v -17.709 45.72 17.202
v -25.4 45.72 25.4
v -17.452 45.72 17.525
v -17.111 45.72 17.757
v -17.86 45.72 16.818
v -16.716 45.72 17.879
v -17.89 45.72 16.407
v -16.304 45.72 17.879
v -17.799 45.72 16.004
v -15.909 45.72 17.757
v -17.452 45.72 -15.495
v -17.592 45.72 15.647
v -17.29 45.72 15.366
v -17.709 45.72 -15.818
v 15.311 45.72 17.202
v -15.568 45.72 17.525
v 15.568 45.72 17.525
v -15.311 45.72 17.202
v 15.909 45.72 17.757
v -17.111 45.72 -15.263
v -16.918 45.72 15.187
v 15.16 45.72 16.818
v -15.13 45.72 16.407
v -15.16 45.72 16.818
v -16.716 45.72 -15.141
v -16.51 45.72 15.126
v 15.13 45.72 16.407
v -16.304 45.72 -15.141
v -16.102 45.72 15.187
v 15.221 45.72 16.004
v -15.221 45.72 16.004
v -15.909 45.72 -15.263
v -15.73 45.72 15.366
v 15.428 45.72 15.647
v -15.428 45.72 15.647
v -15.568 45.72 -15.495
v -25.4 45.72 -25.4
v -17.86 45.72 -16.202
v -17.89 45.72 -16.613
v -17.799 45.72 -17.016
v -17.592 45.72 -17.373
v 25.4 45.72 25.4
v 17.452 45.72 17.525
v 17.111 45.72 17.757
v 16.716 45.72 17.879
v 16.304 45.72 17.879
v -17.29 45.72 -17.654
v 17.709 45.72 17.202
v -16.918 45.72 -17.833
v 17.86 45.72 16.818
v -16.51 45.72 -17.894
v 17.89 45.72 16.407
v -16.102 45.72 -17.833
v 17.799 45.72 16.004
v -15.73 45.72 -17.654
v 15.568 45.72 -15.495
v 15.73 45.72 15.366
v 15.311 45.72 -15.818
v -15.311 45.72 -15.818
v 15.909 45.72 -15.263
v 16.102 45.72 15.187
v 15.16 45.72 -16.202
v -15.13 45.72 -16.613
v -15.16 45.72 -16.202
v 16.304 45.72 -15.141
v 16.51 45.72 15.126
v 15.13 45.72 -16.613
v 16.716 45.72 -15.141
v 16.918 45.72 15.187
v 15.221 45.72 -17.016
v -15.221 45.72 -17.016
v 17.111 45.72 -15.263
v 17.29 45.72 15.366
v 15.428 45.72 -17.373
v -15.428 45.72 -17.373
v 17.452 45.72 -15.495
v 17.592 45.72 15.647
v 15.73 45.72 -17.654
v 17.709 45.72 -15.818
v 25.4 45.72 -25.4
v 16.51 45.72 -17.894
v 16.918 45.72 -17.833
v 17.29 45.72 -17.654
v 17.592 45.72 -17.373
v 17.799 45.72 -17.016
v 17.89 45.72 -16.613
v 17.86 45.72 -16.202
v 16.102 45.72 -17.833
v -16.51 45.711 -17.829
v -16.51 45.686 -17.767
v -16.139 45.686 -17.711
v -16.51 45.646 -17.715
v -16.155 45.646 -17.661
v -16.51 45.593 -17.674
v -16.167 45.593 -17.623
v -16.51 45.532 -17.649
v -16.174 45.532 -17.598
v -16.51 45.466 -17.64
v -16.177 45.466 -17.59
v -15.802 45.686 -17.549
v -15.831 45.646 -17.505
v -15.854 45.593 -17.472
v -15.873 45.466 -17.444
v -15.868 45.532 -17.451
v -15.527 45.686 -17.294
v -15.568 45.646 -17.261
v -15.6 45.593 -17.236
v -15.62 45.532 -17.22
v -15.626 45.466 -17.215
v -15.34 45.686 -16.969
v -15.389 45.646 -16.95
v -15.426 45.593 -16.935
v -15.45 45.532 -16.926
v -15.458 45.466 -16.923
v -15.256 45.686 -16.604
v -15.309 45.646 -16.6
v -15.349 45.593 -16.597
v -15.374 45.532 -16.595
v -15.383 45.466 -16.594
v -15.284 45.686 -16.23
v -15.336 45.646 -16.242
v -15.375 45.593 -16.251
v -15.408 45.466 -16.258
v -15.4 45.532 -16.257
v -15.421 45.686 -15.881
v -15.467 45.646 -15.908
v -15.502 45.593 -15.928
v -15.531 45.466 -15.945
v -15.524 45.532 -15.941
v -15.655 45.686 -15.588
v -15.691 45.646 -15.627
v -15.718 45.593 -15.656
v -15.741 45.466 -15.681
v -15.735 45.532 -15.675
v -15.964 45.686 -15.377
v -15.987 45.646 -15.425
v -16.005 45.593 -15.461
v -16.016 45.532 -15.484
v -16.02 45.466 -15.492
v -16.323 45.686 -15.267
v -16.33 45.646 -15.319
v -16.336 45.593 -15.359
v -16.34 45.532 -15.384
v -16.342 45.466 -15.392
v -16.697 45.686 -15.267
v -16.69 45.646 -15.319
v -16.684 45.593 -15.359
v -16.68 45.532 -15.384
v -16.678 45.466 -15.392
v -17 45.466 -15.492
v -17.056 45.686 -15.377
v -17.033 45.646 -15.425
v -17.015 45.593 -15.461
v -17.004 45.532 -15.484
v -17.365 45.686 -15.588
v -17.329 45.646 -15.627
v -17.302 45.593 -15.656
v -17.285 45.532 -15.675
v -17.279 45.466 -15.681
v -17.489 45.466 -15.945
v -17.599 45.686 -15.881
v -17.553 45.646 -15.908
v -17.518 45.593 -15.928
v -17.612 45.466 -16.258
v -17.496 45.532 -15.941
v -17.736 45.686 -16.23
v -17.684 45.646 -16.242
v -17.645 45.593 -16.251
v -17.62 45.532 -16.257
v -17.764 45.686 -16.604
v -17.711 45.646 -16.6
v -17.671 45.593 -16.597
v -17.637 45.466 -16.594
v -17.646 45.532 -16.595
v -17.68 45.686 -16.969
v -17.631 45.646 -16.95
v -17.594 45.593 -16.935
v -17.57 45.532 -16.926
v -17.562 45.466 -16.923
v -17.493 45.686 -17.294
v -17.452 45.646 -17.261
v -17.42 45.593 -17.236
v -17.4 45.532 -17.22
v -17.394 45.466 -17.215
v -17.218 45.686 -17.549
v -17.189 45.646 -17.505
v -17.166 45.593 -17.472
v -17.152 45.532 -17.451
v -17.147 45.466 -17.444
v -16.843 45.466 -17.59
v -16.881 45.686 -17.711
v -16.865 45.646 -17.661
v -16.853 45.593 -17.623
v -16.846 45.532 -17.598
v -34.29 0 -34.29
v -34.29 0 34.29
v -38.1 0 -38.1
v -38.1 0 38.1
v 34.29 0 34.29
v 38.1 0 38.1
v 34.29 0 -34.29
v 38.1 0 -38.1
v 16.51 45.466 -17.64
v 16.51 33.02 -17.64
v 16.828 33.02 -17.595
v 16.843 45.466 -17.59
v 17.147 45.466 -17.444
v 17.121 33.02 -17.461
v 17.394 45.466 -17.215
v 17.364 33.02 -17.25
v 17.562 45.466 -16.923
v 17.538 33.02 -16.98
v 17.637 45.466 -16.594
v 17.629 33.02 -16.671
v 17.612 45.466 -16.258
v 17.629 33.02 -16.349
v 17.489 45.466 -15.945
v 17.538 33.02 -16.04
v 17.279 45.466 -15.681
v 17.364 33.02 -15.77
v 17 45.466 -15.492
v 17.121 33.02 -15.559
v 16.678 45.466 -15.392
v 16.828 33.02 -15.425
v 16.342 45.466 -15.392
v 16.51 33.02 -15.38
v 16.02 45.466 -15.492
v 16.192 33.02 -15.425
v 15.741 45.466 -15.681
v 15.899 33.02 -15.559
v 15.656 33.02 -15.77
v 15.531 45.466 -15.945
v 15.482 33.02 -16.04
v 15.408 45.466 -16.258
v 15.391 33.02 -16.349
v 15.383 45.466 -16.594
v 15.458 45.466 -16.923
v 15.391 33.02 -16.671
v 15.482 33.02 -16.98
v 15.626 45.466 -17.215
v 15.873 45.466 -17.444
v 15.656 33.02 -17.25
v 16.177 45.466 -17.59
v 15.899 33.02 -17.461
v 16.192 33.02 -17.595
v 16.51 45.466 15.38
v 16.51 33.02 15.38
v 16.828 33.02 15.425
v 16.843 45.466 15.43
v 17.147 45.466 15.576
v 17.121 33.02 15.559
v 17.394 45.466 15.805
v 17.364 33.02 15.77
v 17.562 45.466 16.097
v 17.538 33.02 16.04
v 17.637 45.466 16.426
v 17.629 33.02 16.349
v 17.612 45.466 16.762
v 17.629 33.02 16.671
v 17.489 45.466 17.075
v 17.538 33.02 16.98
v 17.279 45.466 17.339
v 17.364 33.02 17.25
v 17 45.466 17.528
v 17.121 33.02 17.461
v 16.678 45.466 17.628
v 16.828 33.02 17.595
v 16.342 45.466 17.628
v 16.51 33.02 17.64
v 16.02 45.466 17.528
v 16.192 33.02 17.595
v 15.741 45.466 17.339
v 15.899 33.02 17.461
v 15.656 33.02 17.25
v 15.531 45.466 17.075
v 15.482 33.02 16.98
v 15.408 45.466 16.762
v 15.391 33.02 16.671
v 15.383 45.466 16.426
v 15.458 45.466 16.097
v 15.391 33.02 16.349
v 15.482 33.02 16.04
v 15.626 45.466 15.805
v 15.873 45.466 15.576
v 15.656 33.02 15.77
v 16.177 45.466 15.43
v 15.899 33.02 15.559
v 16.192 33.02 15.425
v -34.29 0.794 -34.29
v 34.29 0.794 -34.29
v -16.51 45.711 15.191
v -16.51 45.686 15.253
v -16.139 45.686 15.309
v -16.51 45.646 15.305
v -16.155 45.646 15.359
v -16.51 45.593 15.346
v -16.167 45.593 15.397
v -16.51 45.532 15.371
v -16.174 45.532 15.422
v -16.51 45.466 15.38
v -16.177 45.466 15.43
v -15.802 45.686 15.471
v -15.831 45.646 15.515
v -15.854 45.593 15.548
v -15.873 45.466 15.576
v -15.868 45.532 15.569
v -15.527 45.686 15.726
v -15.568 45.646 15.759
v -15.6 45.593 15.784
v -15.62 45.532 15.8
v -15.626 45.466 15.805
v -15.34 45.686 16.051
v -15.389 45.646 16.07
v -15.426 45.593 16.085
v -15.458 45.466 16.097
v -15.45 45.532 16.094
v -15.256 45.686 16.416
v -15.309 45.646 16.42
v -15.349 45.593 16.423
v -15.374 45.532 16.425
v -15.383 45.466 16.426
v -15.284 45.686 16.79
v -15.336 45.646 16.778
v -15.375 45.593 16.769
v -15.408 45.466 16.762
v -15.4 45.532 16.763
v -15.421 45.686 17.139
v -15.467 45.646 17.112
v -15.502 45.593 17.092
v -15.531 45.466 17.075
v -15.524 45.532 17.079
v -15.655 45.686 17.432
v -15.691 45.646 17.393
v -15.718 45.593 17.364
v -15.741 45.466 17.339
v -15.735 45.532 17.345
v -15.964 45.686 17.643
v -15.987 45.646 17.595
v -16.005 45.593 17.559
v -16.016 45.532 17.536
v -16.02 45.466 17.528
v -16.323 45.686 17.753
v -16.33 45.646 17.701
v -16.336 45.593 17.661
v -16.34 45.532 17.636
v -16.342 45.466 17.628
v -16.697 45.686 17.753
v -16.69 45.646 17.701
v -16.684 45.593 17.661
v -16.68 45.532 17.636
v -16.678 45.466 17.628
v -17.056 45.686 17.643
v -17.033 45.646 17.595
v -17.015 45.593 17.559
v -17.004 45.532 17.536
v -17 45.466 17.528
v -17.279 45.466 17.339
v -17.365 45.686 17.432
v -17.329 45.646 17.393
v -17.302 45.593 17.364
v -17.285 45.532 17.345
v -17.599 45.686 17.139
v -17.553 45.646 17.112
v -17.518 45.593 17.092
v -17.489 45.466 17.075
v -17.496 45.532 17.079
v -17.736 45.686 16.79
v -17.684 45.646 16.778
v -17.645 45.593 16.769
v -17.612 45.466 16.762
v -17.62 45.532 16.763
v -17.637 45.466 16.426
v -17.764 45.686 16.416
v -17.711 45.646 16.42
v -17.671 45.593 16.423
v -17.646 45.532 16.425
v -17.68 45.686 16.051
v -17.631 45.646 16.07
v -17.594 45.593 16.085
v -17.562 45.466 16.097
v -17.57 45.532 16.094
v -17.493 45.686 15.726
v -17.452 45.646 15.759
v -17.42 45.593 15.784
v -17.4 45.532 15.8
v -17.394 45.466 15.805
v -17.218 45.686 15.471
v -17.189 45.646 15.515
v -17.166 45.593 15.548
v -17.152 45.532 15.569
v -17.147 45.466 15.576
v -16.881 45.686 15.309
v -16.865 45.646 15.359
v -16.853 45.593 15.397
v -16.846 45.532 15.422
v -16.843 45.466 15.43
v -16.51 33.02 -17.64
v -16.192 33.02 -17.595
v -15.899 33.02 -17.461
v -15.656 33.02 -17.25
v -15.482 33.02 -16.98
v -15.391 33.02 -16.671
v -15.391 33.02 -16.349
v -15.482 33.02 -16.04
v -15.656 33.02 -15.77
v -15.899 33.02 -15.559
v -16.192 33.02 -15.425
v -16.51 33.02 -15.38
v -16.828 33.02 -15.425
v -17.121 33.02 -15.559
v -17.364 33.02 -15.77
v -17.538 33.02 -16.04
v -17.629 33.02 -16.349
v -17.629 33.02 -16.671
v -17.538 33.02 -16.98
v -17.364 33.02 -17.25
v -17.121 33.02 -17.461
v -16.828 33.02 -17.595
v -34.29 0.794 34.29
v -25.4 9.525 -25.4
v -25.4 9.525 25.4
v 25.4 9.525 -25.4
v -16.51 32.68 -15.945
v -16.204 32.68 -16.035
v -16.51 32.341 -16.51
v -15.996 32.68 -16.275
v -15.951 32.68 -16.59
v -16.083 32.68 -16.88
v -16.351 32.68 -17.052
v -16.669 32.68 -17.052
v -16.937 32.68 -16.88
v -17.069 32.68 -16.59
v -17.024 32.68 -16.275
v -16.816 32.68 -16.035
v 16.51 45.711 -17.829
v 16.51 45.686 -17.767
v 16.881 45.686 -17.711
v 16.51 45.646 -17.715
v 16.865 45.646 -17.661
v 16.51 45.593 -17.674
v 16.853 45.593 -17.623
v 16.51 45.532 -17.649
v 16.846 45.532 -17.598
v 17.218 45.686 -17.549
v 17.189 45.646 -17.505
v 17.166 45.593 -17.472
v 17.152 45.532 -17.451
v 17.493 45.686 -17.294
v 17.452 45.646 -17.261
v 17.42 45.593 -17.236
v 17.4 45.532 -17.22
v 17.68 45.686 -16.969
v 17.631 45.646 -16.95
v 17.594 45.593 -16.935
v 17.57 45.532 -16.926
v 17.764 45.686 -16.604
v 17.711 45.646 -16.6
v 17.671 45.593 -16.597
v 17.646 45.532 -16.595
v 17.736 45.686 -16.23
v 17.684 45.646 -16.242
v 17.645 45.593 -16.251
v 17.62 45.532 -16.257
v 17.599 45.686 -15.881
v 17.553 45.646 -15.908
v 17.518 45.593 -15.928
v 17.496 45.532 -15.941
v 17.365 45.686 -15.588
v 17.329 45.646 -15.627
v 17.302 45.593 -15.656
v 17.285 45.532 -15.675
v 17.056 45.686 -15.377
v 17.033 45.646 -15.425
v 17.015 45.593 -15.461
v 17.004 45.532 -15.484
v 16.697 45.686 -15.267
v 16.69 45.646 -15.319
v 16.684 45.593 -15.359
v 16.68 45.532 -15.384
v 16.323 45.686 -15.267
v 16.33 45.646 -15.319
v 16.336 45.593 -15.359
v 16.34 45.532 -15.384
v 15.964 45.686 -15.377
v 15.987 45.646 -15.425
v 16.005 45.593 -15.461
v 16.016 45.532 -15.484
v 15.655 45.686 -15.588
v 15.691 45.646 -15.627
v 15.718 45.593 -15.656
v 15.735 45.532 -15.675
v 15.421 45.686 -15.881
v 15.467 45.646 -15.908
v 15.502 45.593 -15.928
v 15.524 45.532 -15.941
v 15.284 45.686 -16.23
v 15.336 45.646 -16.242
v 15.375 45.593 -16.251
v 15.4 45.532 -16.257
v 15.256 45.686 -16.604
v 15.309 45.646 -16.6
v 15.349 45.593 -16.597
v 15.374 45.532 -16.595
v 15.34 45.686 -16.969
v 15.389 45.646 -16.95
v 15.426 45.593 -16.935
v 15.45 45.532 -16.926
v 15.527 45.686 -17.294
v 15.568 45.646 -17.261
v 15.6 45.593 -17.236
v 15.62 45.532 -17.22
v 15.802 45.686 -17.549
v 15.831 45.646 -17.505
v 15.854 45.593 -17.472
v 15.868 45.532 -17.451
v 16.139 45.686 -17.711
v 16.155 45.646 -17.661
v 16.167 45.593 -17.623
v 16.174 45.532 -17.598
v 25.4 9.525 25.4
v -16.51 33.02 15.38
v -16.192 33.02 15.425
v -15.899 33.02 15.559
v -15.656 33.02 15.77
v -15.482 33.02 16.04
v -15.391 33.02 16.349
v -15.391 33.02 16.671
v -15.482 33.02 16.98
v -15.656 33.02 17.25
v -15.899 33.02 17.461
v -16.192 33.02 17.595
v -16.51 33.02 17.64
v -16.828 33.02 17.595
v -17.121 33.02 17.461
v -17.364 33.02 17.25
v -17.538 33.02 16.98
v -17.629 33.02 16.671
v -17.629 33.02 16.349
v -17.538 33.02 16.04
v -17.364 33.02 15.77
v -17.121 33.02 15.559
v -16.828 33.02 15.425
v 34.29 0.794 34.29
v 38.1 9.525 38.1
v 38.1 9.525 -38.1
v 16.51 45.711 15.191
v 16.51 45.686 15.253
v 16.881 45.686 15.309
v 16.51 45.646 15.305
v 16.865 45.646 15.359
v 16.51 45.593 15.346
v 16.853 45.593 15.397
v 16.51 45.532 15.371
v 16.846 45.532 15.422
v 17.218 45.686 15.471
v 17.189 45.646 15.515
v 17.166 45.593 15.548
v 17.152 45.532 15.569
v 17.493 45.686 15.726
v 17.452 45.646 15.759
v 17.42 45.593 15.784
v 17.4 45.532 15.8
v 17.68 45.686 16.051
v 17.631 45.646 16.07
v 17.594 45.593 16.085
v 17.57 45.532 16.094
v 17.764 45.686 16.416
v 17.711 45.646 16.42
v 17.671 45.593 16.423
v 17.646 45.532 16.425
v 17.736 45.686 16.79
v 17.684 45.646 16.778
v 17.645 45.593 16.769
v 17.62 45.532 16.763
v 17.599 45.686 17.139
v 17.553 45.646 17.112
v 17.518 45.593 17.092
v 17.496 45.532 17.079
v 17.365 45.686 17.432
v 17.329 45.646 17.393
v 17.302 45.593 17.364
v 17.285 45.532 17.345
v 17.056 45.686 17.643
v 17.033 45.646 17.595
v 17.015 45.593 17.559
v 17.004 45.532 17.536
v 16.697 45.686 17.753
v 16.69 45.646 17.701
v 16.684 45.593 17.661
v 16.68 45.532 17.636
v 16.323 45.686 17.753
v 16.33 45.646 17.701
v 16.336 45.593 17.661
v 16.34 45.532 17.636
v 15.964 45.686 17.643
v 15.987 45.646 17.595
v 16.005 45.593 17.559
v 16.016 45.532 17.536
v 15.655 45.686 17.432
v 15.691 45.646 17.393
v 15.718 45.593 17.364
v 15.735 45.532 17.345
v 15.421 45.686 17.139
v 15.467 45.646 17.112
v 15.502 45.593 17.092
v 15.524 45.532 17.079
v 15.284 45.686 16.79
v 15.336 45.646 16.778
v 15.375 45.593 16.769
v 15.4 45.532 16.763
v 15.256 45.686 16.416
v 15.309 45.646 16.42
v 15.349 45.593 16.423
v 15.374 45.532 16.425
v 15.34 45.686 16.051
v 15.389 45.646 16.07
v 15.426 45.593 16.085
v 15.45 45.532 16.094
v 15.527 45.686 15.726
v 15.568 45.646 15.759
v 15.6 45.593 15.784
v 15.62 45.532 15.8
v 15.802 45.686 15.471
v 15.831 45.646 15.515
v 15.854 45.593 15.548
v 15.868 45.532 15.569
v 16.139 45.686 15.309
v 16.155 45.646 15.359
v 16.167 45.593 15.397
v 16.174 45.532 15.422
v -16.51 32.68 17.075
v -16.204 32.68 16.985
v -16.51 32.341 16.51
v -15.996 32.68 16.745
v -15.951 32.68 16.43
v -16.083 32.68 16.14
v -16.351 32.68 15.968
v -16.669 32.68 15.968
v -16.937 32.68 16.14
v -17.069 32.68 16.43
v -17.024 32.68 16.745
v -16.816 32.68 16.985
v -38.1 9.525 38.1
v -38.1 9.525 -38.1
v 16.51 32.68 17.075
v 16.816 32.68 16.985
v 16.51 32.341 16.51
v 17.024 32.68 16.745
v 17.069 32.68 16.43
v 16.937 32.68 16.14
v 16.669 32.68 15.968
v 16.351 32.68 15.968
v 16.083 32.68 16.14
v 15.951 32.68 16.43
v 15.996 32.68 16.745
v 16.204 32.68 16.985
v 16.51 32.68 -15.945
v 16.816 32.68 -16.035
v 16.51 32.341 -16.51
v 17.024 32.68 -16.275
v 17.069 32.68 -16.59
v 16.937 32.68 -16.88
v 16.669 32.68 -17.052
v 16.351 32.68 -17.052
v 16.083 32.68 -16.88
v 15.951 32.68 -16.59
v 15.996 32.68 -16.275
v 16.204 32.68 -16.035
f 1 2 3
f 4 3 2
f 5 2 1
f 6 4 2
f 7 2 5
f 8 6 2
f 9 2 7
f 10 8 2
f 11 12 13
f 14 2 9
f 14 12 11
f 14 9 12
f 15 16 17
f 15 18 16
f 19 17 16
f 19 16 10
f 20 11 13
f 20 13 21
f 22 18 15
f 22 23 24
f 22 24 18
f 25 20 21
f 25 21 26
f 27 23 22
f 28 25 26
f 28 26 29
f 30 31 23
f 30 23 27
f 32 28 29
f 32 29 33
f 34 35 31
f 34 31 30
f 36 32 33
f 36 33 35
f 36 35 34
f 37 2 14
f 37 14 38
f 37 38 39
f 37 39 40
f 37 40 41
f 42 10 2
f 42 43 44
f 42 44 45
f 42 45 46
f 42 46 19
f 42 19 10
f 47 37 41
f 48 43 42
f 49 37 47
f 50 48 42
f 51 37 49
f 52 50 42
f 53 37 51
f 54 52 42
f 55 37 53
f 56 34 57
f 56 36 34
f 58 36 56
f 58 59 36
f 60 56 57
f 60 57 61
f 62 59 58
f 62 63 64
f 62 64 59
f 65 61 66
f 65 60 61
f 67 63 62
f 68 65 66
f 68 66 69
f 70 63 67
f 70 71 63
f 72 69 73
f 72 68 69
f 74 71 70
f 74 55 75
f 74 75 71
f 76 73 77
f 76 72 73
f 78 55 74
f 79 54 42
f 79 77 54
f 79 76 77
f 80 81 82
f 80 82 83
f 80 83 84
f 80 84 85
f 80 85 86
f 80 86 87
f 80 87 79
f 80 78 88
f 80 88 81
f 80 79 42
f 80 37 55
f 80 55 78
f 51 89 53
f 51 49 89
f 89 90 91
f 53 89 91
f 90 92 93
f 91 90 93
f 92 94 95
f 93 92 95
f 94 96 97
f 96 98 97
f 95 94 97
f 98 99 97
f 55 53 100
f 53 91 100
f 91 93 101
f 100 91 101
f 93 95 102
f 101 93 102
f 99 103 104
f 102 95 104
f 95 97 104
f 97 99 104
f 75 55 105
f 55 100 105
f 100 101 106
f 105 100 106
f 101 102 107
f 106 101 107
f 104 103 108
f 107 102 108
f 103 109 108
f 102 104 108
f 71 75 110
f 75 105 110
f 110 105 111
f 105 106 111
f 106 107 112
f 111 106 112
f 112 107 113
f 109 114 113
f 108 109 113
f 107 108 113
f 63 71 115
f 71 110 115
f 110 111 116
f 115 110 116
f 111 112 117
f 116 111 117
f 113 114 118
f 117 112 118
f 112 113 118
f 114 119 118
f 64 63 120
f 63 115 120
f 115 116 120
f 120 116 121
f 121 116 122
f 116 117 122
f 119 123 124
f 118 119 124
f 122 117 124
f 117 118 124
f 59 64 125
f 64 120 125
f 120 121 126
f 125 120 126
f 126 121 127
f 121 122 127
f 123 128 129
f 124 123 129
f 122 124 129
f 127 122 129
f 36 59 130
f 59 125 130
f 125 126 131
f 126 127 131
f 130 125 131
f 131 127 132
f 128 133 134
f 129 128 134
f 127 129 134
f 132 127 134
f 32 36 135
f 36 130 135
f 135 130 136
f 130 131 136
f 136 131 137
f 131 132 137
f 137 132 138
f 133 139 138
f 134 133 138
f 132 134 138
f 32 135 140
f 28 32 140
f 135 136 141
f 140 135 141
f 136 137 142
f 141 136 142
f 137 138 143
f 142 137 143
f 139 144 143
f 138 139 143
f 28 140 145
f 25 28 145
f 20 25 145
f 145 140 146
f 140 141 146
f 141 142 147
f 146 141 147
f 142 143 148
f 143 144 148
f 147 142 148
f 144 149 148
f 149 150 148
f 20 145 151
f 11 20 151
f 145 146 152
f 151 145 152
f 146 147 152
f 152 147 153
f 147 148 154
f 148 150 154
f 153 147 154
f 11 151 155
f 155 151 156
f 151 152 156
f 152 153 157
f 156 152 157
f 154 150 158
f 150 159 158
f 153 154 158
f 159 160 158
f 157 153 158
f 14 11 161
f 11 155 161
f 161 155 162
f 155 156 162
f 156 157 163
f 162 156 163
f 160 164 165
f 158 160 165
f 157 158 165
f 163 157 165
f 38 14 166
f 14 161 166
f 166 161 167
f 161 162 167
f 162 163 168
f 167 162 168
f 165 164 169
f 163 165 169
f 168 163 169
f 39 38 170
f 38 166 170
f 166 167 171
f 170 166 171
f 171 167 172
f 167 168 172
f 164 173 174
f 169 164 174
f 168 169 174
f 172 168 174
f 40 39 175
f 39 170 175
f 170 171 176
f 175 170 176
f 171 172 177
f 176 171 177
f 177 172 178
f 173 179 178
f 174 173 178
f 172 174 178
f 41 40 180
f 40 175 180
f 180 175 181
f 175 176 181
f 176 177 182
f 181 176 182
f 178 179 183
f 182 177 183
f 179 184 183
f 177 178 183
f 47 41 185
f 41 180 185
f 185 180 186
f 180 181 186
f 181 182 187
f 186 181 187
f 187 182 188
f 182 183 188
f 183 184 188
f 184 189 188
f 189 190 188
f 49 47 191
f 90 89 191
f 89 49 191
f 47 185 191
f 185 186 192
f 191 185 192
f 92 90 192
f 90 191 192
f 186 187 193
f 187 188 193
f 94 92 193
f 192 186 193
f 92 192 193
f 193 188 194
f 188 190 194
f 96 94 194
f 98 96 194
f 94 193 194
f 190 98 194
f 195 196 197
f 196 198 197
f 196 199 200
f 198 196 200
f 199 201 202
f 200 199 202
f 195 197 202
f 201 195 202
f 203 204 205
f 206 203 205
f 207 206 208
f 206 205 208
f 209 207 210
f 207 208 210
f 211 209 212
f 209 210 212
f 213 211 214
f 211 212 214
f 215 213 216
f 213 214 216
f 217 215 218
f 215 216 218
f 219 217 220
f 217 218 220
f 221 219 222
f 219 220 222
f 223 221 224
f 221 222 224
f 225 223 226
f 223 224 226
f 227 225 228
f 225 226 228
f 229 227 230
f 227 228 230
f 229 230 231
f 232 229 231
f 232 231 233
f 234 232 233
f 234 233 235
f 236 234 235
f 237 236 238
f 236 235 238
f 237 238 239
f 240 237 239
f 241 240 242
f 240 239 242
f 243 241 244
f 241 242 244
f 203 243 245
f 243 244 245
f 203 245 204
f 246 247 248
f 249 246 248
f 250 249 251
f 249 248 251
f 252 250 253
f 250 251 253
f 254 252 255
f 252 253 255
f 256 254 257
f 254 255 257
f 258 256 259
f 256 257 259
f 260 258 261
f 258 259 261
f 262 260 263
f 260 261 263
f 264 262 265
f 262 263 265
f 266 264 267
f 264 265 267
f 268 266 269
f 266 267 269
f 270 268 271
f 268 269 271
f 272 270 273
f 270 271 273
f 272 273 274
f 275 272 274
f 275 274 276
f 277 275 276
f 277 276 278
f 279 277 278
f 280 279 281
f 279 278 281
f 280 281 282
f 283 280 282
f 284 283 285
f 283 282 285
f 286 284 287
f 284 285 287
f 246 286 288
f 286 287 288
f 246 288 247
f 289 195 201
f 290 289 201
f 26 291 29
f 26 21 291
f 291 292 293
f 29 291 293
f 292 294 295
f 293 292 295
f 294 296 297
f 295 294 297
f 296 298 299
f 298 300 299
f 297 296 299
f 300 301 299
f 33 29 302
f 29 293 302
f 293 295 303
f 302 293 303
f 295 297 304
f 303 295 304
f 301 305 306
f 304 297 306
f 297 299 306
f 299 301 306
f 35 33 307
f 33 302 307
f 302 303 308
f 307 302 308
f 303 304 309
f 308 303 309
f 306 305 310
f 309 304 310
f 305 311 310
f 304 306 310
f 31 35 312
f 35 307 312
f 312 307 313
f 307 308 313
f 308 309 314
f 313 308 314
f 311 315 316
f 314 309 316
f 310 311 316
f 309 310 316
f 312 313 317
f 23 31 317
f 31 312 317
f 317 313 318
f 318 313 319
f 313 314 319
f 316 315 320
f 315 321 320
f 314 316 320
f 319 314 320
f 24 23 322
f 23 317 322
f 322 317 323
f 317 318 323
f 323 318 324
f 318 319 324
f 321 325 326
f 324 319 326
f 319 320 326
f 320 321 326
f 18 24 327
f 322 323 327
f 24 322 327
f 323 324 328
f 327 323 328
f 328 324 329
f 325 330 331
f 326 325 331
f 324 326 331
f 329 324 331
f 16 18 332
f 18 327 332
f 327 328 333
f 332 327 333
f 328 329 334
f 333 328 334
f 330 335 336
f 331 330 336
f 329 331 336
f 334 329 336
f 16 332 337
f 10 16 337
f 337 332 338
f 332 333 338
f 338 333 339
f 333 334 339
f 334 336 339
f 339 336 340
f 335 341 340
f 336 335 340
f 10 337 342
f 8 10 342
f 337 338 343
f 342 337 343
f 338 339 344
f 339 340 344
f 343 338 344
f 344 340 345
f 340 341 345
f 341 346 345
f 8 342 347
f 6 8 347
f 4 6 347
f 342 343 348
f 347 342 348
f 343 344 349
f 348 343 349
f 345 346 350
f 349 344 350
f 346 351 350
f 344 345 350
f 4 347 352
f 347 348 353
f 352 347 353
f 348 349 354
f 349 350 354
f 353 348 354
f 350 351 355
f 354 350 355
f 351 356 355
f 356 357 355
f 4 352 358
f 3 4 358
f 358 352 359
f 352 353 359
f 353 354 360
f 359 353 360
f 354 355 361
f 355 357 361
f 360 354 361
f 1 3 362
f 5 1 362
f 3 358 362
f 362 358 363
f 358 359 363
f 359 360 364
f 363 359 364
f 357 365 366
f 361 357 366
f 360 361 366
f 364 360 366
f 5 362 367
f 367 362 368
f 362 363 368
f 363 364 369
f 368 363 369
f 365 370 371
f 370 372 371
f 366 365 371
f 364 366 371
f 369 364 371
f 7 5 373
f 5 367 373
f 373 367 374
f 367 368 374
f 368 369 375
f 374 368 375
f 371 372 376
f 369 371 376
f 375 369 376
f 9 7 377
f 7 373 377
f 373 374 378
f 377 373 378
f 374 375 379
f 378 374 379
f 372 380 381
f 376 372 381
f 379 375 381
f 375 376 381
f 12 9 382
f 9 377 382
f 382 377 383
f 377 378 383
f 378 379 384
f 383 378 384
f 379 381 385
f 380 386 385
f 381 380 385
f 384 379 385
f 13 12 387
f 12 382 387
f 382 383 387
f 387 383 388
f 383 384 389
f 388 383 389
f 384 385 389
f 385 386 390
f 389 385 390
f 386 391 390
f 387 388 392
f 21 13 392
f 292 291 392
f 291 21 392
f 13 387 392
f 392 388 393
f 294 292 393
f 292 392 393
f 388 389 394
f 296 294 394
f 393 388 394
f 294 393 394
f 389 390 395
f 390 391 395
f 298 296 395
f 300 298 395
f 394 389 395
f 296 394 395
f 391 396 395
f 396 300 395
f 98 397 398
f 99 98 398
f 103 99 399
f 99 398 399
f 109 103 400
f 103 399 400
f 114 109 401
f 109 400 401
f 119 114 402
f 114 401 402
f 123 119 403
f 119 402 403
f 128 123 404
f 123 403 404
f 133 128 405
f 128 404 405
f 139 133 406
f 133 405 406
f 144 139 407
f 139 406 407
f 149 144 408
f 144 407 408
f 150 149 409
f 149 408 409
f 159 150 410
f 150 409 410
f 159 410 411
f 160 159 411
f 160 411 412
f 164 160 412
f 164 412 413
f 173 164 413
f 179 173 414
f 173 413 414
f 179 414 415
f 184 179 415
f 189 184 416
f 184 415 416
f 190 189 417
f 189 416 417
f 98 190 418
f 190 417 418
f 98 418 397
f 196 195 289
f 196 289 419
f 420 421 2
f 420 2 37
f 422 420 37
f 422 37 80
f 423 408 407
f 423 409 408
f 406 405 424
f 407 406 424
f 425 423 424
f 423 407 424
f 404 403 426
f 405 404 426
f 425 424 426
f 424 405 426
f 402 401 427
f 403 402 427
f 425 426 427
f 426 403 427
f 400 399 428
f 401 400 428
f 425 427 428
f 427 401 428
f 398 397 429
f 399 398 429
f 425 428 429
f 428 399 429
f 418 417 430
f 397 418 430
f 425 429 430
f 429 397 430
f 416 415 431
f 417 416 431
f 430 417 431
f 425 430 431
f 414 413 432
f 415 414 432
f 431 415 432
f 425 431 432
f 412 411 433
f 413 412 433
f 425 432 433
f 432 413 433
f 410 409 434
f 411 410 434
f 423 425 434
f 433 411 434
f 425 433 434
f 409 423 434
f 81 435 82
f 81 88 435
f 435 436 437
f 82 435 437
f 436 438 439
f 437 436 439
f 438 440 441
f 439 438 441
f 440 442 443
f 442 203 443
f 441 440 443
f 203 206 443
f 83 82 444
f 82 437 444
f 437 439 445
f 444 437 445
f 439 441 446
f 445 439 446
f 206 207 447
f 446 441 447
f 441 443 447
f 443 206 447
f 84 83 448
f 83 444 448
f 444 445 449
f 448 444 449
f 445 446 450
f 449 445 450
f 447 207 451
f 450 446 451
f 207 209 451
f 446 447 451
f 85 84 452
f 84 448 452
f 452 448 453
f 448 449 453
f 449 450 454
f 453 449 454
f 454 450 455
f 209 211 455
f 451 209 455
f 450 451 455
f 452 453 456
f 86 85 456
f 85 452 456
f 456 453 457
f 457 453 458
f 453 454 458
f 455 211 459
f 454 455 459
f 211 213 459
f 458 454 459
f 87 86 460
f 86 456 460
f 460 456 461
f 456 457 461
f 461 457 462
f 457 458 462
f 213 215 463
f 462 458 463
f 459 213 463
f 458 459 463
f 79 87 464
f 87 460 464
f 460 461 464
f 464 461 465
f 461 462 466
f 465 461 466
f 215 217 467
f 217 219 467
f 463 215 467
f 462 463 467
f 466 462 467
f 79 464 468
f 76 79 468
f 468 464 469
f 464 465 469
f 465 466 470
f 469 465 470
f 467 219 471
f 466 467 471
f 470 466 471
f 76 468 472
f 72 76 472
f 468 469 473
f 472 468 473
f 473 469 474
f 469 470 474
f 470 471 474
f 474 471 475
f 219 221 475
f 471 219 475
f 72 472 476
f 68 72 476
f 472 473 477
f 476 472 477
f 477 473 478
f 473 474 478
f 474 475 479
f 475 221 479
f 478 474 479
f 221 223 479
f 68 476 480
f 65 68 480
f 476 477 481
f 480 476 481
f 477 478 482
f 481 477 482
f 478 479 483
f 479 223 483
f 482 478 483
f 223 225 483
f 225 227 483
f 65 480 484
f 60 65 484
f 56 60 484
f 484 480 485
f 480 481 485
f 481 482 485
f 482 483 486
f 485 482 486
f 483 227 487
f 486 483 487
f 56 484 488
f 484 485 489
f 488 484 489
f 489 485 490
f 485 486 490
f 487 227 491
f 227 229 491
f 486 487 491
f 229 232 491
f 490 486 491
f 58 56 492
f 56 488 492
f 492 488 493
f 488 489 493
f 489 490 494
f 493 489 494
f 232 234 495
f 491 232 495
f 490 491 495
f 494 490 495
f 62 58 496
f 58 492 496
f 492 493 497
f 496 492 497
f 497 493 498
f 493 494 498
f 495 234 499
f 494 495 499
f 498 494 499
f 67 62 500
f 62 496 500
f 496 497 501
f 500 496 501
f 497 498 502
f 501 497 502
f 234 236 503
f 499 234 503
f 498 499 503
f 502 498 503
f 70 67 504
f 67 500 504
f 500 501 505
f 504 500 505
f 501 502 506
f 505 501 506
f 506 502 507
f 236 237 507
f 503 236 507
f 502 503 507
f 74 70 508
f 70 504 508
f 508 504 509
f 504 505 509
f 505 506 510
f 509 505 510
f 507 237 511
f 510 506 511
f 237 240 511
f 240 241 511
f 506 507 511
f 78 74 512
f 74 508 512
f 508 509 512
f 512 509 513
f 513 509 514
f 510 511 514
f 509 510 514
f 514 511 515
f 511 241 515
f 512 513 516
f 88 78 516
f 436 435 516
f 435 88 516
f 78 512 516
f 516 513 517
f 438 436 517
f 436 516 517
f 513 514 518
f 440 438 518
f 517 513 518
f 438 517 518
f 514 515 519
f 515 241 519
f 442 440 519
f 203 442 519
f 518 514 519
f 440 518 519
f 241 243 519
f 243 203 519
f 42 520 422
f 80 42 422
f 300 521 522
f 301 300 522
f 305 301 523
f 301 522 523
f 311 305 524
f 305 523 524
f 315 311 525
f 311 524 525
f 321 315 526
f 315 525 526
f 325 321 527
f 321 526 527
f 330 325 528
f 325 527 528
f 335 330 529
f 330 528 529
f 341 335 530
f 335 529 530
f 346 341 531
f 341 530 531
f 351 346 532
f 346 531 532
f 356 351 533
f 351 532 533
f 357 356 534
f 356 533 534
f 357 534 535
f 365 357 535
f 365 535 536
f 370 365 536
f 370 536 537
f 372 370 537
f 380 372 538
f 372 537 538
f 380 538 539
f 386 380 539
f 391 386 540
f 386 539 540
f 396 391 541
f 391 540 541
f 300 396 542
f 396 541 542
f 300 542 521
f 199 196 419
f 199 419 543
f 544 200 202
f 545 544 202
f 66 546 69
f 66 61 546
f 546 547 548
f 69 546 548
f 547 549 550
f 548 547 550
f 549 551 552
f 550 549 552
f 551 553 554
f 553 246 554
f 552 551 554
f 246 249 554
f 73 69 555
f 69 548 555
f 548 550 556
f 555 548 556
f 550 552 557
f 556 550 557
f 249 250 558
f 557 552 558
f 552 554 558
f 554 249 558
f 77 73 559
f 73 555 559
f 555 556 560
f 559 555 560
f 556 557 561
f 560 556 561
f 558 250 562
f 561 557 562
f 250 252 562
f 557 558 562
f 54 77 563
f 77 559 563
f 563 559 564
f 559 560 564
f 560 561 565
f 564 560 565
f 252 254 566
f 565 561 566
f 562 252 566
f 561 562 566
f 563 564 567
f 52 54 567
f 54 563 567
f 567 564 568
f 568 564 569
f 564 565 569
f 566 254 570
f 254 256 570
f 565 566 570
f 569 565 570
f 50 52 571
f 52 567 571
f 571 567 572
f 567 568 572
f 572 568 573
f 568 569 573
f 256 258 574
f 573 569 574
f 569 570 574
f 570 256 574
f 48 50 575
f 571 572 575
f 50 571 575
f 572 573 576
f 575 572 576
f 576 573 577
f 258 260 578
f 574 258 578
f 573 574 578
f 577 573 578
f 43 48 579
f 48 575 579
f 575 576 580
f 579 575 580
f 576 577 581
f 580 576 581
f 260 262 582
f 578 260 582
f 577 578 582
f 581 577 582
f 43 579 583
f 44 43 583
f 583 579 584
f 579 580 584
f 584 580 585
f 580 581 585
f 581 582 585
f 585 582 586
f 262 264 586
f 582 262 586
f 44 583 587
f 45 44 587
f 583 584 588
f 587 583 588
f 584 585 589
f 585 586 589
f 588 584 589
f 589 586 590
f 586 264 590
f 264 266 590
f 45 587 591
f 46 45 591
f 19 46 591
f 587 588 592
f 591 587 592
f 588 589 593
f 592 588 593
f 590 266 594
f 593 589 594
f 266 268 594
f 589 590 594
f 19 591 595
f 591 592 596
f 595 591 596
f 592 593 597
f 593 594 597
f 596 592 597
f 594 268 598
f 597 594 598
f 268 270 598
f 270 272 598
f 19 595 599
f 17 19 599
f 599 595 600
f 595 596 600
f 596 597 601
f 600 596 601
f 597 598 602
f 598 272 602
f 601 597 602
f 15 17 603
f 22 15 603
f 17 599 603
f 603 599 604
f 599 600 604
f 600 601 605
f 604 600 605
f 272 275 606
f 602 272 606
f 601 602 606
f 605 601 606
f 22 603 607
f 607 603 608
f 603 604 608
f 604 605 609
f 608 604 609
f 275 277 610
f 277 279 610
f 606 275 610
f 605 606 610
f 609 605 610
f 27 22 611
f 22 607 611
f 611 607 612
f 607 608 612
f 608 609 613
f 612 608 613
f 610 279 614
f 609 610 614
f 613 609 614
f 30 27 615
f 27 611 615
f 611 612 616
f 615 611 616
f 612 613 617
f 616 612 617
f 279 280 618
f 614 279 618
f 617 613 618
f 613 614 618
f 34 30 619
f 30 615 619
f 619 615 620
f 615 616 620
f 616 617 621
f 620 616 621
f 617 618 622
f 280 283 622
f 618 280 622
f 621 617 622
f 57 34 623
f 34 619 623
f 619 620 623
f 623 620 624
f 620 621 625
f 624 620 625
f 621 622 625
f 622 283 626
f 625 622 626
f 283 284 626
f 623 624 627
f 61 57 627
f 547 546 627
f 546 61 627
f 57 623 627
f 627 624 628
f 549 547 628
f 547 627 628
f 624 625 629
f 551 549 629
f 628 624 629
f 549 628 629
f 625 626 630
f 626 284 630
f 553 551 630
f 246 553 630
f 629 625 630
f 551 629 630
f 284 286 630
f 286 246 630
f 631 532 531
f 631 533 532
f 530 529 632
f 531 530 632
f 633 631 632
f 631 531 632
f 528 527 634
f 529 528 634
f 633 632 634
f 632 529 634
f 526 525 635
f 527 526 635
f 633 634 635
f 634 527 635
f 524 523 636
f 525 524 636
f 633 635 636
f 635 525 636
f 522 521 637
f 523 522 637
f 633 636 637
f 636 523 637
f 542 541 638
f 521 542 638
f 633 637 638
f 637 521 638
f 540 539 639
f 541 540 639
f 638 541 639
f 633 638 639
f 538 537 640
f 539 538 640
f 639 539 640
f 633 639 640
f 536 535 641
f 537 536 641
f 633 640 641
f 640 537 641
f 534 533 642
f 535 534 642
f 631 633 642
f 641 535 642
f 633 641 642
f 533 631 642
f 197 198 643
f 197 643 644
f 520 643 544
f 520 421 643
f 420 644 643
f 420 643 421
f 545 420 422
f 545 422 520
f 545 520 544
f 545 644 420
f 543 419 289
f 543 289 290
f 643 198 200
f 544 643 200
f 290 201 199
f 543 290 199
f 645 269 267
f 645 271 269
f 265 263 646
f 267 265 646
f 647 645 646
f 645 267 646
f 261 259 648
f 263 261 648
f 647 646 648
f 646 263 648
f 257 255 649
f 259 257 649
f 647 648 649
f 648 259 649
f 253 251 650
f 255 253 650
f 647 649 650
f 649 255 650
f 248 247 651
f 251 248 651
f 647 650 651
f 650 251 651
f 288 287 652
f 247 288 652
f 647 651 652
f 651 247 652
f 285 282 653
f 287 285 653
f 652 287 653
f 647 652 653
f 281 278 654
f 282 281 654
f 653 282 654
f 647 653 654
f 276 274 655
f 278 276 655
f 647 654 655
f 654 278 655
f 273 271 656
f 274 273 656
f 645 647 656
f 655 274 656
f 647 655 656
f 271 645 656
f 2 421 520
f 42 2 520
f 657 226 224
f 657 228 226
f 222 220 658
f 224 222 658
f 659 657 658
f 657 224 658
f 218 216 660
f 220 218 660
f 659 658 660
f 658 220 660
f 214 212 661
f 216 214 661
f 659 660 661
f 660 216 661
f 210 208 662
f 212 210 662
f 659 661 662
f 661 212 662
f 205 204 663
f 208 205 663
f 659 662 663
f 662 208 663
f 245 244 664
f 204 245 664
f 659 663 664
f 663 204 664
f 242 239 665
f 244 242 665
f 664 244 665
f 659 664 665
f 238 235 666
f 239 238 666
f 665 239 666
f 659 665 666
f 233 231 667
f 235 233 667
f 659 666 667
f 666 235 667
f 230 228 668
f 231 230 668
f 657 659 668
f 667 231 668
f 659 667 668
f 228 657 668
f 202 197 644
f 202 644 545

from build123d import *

# Parameters (mm, degrees)
SKETCH1_W                 = 76.2
SKETCH1_H                 = 76.2
EXTRUDE1_DEPTH            = 9.525
SKETCH2_W                 = 68.58
SKETCH2_H                 = 68.58
EXTRUDE2_DEPTH            = 0.79375
SKETCH6_W                 = 50.8
SKETCH6_H                 = 50.8
EXTRUDE4_DEPTH            = 36.195
F_4_40_TAPPED_HOLE1_D     = 2.2606
F_4_40_TAPPED_HOLE1_DEPTH = 12.7
F_4_40_TAPPED_HOLE1_TIP   = 0.679152758
FILLET1_R                 = 0.254


with BuildPart() as part:
    # Sketch1 → Extrude1 (new body)
    with BuildSketch(Plane(origin=(0, 0, 0), x_dir=(1, 0, 0), z_dir=(0, 1, 0))):
        Rectangle(SKETCH1_W, SKETCH1_H)
    extrude(amount=EXTRUDE1_DEPTH)

    # Sketch2 → Extrude2 (cut)
    with BuildSketch(Plane.XZ):
        Rectangle(SKETCH2_W, SKETCH2_H)
    extrude(amount=-EXTRUDE2_DEPTH, mode=Mode.SUBTRACT)

    # Sketch6 → Extrude4 (add)
    with BuildSketch(Plane(origin=(0, 9.525, 0), x_dir=(1, 0, 0), z_dir=(0, 1, 0))):
        Rectangle(SKETCH6_W, SKETCH6_H)
    extrude(amount=EXTRUDE4_DEPTH)

    # #4-40 Tapped Hole1
    with Locations(Plane(origin=(-16.51, 45.72, -16.51), x_dir=(0, 0, 1), z_dir=(0, 1, 0))):
        with Locations((0, 0), (33.02, 0), (33.02, 33.02), (0, 33.02)):
            Hole(F_4_40_TAPPED_HOLE1_D / 2, depth=F_4_40_TAPPED_HOLE1_DEPTH)
            with Locations((0, 0, -(F_4_40_TAPPED_HOLE1_DEPTH + F_4_40_TAPPED_HOLE1_TIP / 2))):  # 118° drill point
                Cone(0, F_4_40_TAPPED_HOLE1_D / 2, F_4_40_TAPPED_HOLE1_TIP, mode=Mode.SUBTRACT)

    # Fillet1
    fillet1_edges = [part.edges().sort_by_distance(p)[0] for p in [
        (16.51, 45.72, -15.3797),
        (16.51, 45.72, 17.6403),
        (-16.51, 45.72, 17.6403),
        (-16.51, 45.72, -15.3797),
    ]]
    fillet(fillet1_edges, radius=FILLET1_R)


solid = part.part
